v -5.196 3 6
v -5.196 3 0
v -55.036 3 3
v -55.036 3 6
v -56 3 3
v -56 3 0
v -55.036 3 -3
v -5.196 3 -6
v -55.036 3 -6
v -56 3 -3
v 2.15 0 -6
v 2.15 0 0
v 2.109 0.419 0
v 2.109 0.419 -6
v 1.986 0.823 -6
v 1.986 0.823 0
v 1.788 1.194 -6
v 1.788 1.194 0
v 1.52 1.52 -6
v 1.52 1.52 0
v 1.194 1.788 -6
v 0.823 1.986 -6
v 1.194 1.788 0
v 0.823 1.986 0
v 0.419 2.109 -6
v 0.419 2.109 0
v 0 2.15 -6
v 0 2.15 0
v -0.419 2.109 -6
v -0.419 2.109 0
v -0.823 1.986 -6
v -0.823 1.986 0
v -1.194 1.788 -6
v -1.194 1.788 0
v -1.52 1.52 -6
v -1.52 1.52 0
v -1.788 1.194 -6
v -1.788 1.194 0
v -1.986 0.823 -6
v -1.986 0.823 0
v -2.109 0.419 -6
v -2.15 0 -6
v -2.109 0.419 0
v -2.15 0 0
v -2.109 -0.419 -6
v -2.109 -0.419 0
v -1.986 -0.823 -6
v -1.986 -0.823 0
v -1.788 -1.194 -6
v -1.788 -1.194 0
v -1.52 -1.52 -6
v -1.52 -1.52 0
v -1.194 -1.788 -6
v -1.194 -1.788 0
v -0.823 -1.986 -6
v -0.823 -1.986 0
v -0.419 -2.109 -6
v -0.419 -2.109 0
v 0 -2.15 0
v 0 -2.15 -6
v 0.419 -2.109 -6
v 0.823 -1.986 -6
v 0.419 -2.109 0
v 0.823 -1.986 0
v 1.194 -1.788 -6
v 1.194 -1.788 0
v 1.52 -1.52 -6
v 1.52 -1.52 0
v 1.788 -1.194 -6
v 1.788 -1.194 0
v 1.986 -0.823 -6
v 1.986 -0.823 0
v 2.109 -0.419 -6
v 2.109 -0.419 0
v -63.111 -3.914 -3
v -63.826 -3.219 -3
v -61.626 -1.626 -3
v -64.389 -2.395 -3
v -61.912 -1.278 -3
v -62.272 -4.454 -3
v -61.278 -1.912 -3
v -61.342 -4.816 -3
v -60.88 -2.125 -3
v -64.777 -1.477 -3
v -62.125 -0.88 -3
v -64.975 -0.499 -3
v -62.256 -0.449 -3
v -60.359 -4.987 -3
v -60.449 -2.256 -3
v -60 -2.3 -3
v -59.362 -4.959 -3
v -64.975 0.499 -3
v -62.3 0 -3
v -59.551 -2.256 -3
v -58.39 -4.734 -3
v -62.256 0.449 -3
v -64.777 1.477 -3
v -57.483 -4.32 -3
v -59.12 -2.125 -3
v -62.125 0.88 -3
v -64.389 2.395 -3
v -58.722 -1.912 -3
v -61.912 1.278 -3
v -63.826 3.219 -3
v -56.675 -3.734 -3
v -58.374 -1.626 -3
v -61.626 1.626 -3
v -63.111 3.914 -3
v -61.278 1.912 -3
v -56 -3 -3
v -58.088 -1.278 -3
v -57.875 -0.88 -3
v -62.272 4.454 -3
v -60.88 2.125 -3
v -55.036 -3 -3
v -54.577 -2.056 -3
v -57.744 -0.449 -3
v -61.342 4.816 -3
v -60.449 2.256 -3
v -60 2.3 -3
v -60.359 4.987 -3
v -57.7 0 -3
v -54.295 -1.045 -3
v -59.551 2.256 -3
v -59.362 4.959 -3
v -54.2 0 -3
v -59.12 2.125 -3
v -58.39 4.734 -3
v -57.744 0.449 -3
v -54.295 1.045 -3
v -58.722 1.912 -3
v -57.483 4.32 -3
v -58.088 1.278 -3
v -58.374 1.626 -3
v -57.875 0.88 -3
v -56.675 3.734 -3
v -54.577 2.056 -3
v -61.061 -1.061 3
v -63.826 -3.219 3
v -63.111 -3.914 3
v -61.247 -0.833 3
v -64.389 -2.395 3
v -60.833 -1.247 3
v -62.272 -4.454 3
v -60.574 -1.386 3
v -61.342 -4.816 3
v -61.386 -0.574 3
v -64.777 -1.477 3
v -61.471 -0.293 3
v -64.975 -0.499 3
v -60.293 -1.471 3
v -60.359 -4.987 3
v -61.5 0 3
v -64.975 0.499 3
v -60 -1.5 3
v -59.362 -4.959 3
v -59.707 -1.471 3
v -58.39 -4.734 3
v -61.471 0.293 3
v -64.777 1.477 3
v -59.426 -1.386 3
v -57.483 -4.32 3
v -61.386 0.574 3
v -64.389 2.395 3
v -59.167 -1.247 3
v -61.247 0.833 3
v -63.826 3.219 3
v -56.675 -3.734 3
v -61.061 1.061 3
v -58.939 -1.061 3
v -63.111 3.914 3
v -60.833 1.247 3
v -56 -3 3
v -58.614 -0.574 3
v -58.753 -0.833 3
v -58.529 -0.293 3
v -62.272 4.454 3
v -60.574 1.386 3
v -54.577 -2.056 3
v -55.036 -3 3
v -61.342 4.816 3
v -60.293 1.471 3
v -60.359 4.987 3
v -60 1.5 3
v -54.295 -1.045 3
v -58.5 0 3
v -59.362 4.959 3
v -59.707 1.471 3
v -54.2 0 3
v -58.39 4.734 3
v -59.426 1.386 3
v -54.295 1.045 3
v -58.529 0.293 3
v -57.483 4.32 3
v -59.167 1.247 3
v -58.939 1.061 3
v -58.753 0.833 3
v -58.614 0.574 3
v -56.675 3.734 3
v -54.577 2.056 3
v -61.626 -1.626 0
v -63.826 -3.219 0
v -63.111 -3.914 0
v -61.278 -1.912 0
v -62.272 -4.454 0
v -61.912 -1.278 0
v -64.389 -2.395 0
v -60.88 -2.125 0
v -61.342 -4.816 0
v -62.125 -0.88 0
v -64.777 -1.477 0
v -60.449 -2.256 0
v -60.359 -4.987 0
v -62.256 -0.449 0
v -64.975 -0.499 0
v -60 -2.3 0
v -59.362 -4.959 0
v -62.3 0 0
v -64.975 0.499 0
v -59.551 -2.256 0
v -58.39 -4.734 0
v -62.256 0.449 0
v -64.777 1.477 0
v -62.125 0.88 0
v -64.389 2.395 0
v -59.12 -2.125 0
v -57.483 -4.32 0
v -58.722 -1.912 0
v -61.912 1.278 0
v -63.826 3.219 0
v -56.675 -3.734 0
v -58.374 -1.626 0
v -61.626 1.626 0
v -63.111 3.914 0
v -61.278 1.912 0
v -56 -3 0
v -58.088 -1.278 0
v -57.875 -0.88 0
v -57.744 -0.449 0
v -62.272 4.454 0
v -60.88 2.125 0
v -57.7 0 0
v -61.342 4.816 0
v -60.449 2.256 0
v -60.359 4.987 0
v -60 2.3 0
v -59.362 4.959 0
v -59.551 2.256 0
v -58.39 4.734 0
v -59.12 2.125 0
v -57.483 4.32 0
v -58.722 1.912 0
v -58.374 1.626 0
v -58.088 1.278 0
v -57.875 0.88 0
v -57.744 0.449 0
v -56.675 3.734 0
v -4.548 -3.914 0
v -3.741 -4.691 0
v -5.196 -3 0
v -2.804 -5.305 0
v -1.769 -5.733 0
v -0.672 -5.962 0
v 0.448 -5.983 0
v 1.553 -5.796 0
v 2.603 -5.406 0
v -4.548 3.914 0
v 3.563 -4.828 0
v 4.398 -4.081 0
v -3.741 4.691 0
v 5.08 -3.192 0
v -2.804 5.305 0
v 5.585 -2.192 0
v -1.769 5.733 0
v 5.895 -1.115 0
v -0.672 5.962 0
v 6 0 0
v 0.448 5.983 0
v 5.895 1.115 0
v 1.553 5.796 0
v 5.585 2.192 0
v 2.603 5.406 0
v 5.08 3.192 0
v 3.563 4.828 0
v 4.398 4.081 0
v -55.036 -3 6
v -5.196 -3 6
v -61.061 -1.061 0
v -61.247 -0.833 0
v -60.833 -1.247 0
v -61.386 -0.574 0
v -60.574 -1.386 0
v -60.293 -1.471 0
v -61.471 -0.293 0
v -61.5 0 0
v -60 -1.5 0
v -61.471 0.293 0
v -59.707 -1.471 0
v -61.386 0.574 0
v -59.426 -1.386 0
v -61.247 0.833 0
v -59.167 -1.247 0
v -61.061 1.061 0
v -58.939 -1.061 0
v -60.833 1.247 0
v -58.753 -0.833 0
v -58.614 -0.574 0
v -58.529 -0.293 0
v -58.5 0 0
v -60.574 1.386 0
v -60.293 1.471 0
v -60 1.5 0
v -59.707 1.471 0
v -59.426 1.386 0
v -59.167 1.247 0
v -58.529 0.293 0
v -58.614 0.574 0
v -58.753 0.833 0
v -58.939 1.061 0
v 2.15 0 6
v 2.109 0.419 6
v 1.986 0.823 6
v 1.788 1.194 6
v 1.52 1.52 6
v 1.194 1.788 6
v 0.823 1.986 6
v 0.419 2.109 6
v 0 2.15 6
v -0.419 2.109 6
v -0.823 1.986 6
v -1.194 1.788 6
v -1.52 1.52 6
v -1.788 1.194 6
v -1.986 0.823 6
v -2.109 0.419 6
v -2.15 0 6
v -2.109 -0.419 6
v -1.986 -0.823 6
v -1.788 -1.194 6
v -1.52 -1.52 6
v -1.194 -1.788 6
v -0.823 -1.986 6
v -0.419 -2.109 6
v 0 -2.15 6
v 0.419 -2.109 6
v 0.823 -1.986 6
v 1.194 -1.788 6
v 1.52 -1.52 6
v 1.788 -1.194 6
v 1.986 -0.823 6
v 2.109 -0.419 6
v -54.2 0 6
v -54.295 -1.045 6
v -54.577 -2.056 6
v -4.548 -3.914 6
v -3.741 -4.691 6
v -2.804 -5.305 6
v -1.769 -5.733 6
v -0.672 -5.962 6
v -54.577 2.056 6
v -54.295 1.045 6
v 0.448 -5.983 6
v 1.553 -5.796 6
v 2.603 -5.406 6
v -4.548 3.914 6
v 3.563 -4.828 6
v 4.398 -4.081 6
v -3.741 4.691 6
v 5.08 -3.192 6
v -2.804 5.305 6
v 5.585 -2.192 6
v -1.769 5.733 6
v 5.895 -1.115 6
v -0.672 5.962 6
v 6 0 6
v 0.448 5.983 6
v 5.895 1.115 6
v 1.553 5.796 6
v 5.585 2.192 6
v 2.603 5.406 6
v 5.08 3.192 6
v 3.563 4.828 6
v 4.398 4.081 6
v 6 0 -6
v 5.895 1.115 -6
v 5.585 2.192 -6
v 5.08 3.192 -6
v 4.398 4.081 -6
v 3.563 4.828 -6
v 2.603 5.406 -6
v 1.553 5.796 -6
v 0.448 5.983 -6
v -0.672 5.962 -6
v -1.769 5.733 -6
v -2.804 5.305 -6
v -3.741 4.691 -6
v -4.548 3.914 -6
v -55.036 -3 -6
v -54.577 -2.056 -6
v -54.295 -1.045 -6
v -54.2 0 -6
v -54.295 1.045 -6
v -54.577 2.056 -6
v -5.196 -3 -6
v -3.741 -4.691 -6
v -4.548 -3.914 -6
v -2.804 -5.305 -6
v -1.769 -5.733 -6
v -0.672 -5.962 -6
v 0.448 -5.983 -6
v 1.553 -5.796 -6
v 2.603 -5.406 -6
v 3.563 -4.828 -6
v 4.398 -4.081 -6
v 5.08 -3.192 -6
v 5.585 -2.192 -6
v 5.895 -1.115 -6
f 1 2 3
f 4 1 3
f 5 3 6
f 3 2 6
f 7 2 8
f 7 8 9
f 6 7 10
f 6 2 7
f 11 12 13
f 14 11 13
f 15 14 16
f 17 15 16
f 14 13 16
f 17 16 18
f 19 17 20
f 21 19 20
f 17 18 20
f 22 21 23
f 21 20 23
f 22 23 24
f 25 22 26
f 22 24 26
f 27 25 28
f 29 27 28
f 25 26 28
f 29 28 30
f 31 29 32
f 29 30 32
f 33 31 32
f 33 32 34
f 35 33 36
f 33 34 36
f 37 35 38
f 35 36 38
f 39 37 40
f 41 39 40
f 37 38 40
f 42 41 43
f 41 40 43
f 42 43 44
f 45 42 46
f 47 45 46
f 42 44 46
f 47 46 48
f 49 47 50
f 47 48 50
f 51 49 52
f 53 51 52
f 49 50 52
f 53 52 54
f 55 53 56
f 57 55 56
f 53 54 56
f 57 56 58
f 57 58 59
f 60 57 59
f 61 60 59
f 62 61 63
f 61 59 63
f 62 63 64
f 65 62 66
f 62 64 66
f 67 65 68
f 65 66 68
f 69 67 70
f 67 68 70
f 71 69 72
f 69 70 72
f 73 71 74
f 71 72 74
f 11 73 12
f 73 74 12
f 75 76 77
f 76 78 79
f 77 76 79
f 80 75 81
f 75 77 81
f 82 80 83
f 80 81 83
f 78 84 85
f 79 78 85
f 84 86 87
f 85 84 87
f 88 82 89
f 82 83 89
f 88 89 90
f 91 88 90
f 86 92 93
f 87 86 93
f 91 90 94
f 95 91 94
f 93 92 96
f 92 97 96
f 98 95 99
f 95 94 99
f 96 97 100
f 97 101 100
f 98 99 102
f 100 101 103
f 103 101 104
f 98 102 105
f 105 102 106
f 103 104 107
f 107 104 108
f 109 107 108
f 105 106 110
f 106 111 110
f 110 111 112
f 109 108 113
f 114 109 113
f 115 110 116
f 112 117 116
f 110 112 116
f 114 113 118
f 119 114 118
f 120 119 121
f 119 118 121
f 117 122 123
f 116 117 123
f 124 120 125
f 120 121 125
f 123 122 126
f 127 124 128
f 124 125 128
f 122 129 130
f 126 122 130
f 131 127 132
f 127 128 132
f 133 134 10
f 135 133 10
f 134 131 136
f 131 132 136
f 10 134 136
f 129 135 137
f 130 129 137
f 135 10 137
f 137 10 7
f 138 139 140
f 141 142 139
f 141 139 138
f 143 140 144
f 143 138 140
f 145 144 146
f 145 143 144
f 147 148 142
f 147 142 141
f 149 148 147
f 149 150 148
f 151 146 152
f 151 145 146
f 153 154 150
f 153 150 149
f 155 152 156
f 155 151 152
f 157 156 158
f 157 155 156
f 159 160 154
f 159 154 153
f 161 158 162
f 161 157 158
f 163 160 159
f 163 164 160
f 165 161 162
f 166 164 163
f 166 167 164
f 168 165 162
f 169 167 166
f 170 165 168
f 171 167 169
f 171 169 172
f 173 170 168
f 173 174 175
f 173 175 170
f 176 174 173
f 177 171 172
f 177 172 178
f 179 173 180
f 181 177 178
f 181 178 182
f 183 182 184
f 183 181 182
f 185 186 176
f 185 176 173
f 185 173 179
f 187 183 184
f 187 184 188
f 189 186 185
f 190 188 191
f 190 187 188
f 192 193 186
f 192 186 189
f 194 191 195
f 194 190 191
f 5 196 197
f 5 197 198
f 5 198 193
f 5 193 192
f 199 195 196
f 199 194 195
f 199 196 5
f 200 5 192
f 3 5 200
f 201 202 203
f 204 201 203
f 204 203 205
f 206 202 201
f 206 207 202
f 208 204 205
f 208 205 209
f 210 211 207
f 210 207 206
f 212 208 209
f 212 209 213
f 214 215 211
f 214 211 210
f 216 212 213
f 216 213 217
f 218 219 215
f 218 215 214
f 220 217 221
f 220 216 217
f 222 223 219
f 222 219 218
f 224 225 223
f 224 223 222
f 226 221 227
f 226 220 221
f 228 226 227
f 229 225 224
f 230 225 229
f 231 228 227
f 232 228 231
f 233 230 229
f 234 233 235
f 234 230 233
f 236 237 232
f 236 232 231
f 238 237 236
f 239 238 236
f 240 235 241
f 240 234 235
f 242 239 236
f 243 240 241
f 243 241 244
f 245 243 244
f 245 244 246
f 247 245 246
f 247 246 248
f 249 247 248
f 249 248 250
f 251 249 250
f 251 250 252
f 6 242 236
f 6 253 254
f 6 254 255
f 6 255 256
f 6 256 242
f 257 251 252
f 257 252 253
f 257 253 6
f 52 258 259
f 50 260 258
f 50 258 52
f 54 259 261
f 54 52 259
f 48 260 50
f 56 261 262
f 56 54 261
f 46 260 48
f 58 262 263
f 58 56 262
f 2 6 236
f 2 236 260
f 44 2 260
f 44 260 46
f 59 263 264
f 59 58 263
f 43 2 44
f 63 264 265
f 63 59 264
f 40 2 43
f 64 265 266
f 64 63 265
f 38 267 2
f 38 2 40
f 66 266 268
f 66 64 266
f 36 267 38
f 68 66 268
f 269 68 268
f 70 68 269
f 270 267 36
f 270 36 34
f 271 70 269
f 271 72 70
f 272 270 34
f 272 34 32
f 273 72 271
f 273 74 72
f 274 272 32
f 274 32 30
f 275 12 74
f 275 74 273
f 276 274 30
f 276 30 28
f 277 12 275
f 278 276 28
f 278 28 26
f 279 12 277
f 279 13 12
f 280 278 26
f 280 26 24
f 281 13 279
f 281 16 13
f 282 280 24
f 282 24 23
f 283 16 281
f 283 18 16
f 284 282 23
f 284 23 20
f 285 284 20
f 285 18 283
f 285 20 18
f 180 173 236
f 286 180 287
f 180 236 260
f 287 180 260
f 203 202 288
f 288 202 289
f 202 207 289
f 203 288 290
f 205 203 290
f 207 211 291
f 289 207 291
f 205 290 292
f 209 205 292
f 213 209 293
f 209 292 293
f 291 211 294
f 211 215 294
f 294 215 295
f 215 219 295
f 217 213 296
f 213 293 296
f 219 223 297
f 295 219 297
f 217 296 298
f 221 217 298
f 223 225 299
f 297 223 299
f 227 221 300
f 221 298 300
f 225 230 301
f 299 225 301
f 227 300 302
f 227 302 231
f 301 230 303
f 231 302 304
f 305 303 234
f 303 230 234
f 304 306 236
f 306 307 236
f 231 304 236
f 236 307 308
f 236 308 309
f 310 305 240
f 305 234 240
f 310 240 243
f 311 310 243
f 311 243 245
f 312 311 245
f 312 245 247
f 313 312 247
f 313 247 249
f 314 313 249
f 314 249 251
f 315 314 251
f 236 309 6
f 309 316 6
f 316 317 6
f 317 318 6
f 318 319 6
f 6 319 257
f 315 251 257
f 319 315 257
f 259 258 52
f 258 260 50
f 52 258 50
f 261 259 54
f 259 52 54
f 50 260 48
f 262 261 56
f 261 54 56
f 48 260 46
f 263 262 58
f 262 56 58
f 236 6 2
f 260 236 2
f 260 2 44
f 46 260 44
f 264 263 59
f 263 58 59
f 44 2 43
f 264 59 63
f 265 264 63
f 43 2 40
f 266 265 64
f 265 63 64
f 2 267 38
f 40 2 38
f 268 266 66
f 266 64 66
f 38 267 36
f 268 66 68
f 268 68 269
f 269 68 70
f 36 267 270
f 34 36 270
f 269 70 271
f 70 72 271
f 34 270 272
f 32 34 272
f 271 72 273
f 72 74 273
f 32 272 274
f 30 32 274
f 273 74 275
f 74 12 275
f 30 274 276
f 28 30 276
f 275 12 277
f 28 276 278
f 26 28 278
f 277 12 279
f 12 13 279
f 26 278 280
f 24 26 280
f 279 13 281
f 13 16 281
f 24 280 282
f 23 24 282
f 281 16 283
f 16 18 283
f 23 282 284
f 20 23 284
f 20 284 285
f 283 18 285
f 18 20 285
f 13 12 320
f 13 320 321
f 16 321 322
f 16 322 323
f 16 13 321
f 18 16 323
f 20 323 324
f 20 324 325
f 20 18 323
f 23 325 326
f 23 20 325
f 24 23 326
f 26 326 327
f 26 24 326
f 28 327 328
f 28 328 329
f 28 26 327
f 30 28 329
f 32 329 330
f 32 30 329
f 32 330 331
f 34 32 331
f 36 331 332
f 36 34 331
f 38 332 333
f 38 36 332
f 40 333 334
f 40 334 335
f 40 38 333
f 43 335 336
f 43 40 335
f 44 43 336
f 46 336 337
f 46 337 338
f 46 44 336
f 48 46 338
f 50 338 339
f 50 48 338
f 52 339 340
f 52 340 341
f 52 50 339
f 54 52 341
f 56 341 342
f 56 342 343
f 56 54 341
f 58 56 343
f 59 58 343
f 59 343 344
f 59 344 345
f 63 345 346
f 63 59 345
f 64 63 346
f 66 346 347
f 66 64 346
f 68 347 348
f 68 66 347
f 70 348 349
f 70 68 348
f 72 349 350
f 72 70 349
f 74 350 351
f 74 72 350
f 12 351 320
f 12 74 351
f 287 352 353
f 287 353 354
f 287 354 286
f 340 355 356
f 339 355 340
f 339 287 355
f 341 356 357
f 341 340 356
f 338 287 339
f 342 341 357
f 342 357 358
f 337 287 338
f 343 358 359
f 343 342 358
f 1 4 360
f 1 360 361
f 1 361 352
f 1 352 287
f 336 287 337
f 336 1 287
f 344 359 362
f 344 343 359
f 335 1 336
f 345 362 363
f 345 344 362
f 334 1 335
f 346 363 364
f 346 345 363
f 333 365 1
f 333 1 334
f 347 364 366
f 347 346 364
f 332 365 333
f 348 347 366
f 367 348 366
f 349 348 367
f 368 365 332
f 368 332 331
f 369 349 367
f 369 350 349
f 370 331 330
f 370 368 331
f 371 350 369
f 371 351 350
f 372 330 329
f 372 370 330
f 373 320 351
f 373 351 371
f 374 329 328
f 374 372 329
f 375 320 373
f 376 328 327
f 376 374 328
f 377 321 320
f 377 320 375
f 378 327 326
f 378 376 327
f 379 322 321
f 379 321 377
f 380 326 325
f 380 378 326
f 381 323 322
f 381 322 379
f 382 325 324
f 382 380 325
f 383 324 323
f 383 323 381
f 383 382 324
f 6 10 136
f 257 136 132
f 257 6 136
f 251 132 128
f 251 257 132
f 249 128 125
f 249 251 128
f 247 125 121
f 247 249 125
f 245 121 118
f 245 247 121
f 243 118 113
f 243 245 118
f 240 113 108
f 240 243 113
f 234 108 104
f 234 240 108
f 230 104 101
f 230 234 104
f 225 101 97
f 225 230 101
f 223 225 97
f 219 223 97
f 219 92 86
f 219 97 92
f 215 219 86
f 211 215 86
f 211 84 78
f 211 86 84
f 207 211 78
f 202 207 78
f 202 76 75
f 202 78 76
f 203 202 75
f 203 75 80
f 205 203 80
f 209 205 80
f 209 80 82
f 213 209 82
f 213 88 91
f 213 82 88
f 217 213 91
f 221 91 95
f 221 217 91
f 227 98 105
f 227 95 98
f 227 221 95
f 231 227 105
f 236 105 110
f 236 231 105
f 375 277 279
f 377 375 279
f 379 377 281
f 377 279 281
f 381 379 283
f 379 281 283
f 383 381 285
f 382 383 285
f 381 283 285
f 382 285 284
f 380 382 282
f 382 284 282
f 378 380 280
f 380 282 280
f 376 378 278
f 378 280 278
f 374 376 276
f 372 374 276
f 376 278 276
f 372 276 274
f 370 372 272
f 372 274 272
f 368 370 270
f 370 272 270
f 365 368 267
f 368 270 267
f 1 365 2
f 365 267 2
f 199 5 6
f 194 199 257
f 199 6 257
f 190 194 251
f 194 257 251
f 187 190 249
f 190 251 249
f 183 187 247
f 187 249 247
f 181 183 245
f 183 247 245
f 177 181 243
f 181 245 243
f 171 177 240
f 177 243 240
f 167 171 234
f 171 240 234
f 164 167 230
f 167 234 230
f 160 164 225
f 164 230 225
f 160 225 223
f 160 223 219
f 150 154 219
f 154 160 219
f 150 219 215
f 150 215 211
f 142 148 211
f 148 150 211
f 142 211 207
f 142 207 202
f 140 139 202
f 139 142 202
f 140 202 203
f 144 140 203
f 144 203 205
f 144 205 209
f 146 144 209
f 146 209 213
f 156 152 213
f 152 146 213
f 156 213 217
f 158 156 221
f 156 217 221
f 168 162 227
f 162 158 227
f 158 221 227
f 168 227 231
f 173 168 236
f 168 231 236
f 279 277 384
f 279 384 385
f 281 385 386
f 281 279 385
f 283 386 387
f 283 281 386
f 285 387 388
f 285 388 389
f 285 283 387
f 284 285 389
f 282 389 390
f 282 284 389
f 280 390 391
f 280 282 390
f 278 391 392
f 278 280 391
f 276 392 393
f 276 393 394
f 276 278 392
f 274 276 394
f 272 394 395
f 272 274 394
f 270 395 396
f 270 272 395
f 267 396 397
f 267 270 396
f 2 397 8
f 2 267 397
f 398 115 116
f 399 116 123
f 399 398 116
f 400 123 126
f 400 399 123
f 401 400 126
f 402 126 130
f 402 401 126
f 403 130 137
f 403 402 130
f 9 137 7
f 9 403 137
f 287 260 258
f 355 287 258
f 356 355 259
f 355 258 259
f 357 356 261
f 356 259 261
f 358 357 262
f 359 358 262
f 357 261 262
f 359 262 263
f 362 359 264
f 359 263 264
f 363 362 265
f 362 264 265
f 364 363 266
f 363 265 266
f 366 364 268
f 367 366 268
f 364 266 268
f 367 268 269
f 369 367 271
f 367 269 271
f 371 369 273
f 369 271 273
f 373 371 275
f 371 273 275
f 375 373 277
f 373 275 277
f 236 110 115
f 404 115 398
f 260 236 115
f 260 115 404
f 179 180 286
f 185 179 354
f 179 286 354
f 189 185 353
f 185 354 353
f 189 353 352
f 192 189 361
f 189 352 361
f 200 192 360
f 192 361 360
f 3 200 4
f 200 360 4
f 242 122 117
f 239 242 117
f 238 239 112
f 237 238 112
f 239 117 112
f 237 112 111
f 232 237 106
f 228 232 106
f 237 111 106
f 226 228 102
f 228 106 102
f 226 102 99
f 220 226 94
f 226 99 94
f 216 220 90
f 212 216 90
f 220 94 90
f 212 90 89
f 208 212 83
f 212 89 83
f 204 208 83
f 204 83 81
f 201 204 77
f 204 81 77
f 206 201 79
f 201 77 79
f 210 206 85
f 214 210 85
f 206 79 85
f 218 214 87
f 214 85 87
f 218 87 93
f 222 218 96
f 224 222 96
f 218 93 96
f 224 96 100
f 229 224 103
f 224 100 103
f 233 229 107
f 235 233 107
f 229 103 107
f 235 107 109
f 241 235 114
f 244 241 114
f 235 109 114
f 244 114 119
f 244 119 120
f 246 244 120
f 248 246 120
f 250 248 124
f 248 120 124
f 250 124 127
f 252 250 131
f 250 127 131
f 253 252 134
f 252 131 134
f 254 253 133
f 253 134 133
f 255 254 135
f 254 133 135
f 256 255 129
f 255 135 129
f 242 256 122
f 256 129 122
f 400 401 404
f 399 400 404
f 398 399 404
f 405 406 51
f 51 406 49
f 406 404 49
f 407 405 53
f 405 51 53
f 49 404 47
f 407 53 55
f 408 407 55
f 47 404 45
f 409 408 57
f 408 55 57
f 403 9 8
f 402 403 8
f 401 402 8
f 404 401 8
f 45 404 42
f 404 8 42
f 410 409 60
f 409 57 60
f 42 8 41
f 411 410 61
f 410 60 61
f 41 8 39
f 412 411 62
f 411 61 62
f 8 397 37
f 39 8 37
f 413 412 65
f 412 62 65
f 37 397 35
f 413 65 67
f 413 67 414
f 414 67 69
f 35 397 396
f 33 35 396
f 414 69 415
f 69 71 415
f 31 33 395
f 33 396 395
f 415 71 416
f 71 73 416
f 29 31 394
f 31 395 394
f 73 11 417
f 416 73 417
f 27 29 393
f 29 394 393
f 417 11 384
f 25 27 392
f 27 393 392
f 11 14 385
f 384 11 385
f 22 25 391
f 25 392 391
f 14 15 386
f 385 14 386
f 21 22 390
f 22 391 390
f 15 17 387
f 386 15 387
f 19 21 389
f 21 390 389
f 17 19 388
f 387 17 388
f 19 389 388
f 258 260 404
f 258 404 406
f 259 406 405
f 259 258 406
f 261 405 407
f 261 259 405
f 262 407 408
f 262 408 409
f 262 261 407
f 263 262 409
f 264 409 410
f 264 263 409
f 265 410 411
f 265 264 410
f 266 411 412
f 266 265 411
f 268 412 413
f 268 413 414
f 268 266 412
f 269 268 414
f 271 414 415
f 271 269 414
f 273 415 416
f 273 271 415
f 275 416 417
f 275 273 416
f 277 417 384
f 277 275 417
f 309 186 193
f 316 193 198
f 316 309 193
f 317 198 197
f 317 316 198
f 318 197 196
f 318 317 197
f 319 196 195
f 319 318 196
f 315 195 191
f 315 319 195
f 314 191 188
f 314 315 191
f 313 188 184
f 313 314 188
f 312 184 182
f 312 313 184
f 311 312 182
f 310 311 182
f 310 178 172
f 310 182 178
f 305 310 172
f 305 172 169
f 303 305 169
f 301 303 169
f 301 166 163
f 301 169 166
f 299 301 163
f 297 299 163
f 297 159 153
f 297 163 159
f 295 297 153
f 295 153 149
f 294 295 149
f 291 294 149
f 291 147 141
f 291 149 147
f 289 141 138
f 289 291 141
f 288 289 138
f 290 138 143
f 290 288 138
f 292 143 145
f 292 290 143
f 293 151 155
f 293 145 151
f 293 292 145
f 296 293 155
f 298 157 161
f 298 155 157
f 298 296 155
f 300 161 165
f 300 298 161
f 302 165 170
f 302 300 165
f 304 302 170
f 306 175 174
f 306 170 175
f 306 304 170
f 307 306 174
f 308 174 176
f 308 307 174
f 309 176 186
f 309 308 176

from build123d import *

# Parameters (mm, degrees)
F0_R     = 2.15
F0_R_2   = 1.5
F1_DEPTH = 6
F2_R     = 5.8
F3_DEPTH = 3
F5_R     = 2.3
F6_DEPTH = 3


with BuildPart() as f1:
    # F0 (on Top) → F1 (new body)
    with BuildSketch(Plane.XY):
        with BuildLine():
            ThreePointArc((-5.196152, -3), (1.552914, -5.795555), (6, 0))
            ThreePointArc((6, 0), (1.552914, 5.795555), (-5.196152, 3))
            ThreePointArc((-5.196152, 3), (-6, 0), (-5.196152, -3))
        make_face()
        Circle(F0_R, mode=Mode.SUBTRACT)
        with BuildLine():
            ThreePointArc((-5.196152, -3), (-6, 0), (-5.196152, 3))
            Line((-5.196152, 3), (-56, 3))
            ThreePointArc((-56, 3), (-55.256584, 1.581139), (-55, 0))
            ThreePointArc((-55, 0), (-55.256584, -1.581139), (-56, -3))
            Line((-56, -3), (-5.196152, -3))
        make_face()
        with BuildLine():
            ThreePointArc((-55, 0), (-55.256584, 1.581139), (-56, 3))
            ThreePointArc((-56, 3), (-65, 0), (-56, -3))
            ThreePointArc((-56, -3), (-55.256584, -1.581139), (-55, 0))
        make_face()
        with Locations((-60, 0)):
            Circle(F0_R_2, mode=Mode.SUBTRACT)
    extrude(amount=F1_DEPTH)

    # F2 (on face) → F3 (cut)
    with BuildSketch(Plane.XY.offset(6)):
        with Locations((-60, 0)):
            Circle(F2_R)
    extrude(amount=-F3_DEPTH, mode=Mode.SUBTRACT)


with BuildPart() as f4_1:
    # F4: instance of F1
    add(f1.part.mirror(Plane(origin=(-28.597693, 0, 0), x_dir=(1, 0, 0), z_dir=(0, 0, -1))))

    # F5 (on face) → F6 (cut, through all)
    with BuildSketch(Plane(origin=(0, 0, -3), x_dir=(1, 0, 0), z_dir=(0, 0, -1))):
        with Locations((-60, 0)):
            Circle(F5_R)
    extrude(amount=-F6_DEPTH, mode=Mode.SUBTRACT)


solid = Compound([f1.part, f4_1.part])
